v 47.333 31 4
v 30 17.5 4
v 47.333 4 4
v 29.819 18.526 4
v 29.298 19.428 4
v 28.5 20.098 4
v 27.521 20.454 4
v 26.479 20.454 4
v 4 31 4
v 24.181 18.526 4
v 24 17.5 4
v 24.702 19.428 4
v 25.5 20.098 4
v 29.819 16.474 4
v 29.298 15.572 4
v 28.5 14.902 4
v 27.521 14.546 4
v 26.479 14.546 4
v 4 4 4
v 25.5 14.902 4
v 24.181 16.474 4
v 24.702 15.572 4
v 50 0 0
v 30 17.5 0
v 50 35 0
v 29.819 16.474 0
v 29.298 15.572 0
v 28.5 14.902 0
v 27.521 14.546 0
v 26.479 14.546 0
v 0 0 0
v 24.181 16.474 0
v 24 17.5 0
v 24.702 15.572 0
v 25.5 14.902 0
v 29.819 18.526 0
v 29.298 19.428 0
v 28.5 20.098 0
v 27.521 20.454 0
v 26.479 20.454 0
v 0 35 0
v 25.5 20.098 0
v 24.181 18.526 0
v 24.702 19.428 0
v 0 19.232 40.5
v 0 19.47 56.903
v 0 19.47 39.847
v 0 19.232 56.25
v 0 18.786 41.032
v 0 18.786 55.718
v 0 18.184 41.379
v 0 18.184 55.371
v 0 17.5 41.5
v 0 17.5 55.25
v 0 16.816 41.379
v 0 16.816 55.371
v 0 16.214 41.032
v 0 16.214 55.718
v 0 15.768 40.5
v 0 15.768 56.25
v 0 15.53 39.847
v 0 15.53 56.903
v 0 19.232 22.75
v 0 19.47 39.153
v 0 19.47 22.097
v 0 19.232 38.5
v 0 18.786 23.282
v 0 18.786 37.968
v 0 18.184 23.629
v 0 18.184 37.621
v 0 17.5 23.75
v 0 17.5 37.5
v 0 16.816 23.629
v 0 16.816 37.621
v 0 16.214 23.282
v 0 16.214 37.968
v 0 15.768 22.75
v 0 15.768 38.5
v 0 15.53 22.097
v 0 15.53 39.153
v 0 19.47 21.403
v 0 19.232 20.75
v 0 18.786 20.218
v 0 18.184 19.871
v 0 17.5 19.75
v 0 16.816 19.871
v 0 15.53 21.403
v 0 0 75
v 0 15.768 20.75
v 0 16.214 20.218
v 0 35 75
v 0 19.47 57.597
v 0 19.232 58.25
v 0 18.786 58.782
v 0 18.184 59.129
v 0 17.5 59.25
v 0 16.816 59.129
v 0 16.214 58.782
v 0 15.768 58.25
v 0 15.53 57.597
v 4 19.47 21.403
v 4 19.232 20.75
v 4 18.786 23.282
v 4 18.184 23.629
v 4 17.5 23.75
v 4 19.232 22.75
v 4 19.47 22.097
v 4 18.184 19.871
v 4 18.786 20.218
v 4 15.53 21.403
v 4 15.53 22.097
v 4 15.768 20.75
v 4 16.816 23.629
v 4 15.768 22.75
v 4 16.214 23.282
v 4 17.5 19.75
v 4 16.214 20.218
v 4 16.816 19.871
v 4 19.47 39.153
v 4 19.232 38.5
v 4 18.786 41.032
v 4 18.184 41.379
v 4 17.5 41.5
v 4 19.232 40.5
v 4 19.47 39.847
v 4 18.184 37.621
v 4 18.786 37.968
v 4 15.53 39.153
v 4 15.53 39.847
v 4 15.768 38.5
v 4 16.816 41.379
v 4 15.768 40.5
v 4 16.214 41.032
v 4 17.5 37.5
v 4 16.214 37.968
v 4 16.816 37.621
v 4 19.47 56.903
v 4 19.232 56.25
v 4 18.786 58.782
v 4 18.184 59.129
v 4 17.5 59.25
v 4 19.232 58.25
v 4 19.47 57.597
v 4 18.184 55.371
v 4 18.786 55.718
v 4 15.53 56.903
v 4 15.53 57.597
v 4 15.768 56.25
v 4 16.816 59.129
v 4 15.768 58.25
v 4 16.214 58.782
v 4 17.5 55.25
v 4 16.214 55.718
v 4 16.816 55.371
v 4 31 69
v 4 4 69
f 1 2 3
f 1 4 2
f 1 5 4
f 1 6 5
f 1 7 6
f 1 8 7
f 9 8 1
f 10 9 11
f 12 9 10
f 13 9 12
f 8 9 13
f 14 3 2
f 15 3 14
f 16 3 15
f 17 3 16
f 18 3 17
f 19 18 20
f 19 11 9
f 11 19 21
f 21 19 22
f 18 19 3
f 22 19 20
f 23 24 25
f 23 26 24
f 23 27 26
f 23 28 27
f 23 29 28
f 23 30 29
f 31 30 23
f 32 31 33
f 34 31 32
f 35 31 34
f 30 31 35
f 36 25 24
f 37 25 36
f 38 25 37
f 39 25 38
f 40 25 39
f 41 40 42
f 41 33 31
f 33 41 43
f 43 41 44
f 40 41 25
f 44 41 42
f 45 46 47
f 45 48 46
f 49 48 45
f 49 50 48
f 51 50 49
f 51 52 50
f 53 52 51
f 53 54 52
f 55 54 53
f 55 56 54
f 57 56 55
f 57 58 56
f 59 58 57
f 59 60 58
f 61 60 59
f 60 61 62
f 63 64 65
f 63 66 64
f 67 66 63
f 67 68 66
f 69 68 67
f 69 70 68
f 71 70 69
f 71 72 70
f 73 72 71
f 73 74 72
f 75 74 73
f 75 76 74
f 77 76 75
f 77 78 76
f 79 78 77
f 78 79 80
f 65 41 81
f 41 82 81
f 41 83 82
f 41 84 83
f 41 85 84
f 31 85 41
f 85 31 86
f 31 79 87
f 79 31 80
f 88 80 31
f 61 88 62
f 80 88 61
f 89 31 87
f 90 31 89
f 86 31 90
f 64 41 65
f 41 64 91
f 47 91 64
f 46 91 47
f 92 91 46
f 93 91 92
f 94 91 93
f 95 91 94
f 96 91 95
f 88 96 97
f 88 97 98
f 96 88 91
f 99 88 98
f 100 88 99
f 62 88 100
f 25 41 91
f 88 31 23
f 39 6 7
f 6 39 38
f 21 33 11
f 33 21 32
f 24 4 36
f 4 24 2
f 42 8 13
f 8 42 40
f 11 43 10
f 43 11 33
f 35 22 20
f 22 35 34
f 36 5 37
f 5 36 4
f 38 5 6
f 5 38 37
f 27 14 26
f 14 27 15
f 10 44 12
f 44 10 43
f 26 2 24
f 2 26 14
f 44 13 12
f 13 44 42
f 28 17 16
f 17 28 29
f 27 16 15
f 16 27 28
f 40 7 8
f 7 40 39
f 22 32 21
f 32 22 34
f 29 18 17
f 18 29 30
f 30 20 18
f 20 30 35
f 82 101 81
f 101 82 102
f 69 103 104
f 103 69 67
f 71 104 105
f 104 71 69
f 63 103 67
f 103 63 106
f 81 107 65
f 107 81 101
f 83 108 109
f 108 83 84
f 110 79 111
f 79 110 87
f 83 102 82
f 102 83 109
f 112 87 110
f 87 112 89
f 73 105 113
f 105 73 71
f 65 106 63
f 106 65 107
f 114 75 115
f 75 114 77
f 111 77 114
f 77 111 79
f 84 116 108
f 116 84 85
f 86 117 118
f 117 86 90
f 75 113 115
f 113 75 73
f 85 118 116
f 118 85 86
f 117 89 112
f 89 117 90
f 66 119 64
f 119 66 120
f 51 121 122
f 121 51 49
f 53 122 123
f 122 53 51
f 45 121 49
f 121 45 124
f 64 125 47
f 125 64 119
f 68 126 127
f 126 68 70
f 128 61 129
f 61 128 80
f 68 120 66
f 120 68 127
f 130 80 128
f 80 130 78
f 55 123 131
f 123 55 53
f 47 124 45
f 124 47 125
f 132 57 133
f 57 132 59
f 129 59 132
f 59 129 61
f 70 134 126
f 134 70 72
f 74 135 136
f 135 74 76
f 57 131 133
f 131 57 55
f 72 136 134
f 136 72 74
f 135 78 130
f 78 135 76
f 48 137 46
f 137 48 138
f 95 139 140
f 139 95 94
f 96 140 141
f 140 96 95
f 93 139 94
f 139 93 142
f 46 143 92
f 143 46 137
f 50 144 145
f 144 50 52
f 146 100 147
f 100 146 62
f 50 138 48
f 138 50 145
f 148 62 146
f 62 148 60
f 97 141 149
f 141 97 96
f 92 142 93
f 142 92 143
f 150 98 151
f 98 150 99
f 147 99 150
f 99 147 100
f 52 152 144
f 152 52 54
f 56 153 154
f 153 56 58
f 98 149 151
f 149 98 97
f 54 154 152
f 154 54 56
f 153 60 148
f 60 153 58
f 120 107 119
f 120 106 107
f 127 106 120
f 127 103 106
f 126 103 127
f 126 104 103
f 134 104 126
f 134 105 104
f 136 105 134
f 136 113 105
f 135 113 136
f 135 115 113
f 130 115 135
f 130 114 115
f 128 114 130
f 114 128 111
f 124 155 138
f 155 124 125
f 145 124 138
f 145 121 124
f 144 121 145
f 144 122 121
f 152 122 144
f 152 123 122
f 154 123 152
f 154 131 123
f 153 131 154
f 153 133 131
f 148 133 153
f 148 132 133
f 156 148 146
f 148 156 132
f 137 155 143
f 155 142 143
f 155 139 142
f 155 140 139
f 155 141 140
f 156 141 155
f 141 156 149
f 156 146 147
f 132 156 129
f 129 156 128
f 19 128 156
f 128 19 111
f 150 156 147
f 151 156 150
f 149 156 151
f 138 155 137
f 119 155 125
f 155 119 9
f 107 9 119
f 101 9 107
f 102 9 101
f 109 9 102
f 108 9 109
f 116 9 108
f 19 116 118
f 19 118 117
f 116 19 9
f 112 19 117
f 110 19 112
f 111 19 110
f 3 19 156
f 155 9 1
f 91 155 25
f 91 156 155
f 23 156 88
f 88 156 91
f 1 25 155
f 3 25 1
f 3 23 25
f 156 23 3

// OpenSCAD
/*
    module shelf_bracket

    parameters:
    - side_a    is a vector [length, hold diameter, number of holes]
    - side_b    is a vector [length, hold diameter, number of holes]
    - width     refers to the width of the bracket
    - thickness refers to the material thickness of the bracket

    https://mastering-openscad.eu/buch/example_01/
*/

module shelf_bracket ( side_a, side_b, width, thickness, rotate_it = false ) {

    module xhole_plate (size, h_dm, h_num, margin) {
        tr_delta = -1;
        sz_delta = 2;

        difference() {
            cube(size);

            h_distance = (size.x - margin) / (h_num + 1);
            for (x = [1:h_num])
                translate ([
                    margin + x * h_distance,
                    size.y/2,
                    tr_delta
                ])
                cylinder(d = h_dm, h = size.z + sz_delta, $fn=18);
        }
    }

    diag = sqrt( pow(side_a[0], 2) + pow(side_b[0], 2) );
    angle = asin( side_a[0] / diag );

    rotate( [0, rotate_it ? 90 + angle : 0, 0] )
    difference() {
        union() {
            // Side A
            xhole_plate(
                [side_a[0], width, thickness],
                side_a[1],
                side_a[2],
                thickness
            );

            // Side B
            translate([thickness,0,0])
            rotate([0,-90,0])
            xhole_plate(
                [side_b[0], width, thickness],
                side_b[1],
                side_b[2],
                thickness
            );

            // stringers
            cube( [side_a[0], thickness, side_b[0]]);
            translate( [0, width - thickness, 0])
                cube( [side_a[0], thickness, side_b[0]]);
        }

        // diag = sqrt( pow(side_a[0], 2) + pow(side_b[0], 2) );
        // angle = asin( side_a[0] / diag );

        translate( [side_a[0], -1, 0] )
            rotate( [0, -angle, 0] )
            cube( [diag, width + 2, diag + 2]);

    }
}

module output(templates = false) {
    if (templates) {
        projection( cut = true)
        children(0);

        translate( [-0.01, 0, 0] )
            projection(cut = true)
            rotate( [0, -90, 0] )
            children(0);
    } else {
        children(0);
    }
}

output(templates = false)
shelf_bracket(
    side_a    = [50, 6, 1],
    side_b    = [75, 4, 3],
    width     = 35,
    thickness = 4,
    rotate_it = false
);
